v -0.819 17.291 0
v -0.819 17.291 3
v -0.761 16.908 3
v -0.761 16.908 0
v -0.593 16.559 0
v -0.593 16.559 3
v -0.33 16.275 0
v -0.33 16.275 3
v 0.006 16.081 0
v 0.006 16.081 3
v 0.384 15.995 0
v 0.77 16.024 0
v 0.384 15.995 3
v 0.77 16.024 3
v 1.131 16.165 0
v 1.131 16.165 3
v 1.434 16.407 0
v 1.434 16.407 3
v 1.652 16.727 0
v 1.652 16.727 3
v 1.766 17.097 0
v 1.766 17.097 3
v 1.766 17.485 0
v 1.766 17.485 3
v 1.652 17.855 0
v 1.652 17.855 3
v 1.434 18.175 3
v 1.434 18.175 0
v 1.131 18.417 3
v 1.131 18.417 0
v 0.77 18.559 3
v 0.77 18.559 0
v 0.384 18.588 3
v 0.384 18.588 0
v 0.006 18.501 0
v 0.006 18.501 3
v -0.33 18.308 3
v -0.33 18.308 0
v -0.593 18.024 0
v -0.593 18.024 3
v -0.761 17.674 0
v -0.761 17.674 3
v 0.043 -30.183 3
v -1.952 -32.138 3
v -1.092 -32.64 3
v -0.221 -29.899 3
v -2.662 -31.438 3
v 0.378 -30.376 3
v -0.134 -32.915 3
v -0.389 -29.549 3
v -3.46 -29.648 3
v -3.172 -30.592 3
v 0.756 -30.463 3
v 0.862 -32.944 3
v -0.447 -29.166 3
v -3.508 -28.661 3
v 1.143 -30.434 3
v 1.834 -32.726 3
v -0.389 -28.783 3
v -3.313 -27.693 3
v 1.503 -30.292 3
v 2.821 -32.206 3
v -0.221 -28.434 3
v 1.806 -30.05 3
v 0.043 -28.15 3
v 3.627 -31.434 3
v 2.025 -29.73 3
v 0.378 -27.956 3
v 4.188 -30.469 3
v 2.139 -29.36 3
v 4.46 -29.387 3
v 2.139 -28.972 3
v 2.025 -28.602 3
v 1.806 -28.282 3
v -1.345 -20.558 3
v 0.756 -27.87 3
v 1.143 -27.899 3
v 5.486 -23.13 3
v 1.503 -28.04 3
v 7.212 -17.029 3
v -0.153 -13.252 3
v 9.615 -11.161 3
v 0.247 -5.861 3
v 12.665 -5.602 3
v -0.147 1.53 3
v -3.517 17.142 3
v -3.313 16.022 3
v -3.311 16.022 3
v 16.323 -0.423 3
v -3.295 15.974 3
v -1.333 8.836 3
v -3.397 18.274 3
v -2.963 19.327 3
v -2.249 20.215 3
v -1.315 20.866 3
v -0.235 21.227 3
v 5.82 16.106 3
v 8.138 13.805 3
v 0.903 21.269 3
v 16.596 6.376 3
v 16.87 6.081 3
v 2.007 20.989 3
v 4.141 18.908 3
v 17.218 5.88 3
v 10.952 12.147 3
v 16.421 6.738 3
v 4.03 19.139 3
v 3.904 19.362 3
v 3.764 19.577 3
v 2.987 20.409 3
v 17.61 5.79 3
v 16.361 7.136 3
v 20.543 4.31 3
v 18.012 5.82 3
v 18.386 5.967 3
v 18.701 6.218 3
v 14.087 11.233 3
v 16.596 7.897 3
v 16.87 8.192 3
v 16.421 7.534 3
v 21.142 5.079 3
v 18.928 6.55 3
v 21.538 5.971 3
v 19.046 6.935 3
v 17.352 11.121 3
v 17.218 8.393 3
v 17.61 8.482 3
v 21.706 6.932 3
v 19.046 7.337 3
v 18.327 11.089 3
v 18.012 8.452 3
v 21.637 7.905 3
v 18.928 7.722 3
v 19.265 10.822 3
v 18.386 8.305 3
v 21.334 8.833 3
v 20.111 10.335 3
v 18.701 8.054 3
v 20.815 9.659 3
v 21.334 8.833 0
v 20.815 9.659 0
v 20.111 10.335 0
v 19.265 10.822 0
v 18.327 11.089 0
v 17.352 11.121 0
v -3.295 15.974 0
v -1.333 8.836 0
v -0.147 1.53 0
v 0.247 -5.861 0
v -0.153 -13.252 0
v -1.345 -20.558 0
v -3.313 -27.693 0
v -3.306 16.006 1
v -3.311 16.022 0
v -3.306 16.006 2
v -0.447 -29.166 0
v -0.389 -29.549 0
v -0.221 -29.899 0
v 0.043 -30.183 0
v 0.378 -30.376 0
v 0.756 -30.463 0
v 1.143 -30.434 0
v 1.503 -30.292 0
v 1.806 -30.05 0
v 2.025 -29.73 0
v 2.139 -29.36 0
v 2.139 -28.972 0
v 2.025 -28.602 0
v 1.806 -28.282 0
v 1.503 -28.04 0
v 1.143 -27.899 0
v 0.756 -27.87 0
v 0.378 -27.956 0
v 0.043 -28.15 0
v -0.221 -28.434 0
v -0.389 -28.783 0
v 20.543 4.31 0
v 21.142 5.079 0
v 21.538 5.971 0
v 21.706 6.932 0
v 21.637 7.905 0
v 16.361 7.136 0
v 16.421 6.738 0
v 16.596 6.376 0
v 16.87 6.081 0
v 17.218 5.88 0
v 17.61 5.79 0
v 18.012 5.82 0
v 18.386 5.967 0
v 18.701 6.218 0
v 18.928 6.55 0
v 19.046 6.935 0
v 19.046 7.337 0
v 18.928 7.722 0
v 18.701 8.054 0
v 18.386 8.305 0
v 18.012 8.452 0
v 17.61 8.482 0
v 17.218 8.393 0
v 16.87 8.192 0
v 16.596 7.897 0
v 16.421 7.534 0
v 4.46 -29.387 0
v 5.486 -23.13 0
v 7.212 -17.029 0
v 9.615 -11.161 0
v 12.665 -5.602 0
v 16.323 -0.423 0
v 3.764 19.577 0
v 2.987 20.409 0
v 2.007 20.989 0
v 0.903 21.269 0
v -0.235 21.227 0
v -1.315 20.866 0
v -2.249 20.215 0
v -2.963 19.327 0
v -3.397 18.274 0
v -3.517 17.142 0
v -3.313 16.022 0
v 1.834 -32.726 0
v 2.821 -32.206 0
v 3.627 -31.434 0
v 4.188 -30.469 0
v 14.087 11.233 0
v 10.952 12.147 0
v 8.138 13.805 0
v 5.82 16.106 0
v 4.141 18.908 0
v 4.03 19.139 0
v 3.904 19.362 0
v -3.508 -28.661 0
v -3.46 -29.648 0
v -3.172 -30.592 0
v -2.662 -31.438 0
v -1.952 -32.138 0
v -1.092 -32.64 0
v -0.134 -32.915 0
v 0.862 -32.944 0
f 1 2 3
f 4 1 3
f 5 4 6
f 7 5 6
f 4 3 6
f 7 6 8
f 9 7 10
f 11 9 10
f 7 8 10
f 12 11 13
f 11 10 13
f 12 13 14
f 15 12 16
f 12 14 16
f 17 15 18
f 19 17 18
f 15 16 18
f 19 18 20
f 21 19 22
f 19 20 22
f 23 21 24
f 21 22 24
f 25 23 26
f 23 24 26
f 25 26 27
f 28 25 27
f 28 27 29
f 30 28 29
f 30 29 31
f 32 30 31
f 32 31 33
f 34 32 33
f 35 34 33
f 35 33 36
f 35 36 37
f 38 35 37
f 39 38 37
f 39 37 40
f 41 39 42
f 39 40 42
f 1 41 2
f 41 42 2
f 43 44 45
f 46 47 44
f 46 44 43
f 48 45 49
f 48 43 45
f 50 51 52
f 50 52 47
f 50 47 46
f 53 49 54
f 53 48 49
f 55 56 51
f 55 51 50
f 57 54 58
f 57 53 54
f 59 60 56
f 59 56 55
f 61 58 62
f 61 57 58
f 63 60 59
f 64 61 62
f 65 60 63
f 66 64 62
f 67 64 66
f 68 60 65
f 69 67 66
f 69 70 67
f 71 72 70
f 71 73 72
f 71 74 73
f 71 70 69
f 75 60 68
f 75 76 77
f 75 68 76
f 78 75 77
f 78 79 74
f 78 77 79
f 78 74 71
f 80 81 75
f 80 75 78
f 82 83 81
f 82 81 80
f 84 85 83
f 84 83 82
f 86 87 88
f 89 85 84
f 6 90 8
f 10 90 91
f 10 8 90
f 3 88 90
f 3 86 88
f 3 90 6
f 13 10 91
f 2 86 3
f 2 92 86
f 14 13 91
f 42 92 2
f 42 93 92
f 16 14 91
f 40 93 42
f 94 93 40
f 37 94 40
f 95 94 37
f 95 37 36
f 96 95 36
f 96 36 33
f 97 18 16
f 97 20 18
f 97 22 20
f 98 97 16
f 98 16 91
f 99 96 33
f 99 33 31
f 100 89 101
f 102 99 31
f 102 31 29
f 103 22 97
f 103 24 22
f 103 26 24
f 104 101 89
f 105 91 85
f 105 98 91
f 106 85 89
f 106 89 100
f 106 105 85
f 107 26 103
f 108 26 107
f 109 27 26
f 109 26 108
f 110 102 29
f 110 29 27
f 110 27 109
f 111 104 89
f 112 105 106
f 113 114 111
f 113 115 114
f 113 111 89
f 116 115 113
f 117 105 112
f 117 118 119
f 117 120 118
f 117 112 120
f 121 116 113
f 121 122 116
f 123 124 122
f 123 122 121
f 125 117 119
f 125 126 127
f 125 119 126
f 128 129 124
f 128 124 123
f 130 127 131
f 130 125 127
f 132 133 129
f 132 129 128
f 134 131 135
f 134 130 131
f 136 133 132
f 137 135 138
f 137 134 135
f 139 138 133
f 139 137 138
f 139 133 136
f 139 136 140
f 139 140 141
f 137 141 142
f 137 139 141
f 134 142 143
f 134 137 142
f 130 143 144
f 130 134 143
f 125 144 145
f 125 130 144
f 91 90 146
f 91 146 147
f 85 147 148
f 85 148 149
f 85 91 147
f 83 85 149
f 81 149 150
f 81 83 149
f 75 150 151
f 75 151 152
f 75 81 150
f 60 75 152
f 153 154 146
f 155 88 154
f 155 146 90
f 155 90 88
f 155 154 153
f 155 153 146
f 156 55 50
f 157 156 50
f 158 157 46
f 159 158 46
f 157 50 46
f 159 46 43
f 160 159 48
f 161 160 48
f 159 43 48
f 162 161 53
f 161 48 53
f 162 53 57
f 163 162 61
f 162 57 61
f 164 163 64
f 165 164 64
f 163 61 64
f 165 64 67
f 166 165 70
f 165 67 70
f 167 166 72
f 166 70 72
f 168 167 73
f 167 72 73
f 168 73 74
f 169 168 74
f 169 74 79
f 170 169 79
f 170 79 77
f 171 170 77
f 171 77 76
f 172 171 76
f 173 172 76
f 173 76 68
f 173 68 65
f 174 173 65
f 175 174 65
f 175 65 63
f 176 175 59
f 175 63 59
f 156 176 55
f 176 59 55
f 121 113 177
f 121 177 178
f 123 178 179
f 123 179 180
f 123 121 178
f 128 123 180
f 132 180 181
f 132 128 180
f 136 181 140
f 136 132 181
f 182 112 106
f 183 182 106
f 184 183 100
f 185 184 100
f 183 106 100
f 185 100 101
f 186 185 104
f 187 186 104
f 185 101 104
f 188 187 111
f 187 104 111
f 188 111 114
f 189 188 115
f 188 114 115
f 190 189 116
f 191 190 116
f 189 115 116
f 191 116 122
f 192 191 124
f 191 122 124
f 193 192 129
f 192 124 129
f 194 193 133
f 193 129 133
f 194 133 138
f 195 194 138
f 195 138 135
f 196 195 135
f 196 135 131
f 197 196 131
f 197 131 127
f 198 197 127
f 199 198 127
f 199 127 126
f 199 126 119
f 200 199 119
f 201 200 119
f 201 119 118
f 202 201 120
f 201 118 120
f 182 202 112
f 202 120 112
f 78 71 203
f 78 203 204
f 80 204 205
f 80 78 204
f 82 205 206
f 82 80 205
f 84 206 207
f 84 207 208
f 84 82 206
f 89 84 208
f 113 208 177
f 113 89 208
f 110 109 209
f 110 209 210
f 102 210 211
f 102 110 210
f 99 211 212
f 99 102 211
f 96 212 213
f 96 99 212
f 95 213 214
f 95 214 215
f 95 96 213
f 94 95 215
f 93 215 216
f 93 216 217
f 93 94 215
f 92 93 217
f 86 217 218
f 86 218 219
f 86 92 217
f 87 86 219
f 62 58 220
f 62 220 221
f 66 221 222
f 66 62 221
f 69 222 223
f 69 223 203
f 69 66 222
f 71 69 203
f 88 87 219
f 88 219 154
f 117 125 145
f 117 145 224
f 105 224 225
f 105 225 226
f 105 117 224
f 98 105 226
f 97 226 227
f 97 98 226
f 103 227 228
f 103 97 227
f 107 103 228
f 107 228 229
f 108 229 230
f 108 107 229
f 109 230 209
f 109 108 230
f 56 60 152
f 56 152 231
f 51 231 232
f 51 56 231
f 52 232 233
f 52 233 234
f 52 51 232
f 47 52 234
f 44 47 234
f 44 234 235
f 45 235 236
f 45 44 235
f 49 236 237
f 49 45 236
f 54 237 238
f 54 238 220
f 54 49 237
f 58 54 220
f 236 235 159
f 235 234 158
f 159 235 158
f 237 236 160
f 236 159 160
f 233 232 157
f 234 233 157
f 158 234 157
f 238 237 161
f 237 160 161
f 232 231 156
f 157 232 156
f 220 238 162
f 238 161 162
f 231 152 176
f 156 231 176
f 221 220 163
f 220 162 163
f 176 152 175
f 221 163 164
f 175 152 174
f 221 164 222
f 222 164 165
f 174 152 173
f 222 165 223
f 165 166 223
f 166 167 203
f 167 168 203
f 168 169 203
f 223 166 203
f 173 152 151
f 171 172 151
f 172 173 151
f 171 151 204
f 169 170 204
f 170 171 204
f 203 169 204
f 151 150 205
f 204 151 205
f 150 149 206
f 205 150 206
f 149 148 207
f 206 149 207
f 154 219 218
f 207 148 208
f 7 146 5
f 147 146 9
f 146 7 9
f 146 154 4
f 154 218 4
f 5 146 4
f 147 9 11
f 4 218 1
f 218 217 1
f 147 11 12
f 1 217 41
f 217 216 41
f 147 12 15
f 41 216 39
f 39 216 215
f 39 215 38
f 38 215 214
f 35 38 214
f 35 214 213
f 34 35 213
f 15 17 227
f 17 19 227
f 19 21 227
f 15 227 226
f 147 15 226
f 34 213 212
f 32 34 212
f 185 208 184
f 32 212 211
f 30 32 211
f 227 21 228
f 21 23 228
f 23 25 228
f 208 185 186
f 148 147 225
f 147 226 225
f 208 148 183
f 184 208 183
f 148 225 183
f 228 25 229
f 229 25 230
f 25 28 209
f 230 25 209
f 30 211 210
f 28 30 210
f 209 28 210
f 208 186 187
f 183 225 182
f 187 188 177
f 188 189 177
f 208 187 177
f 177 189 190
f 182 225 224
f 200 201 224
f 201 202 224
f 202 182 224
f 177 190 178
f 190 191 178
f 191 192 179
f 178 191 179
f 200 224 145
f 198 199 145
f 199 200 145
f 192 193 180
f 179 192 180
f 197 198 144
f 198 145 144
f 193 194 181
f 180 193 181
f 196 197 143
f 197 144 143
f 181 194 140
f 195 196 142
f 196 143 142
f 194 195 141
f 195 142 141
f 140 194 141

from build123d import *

# Parameters (mm, degrees)
SKETCH_1_R      = 1.3
SKETCH_1_R_2    = 1.35
EXTRUDE_1_DEPTH = 3


with BuildPart() as part:
    # 草图1 → 凸台-拉伸1 (new body)
    with BuildSketch(Plane.XY.offset(3)):
        with BuildLine():
            Line((-3.313115848, 16.021732214), (-3.311115848, 16.021732214))
            add(Edge.make_bspline(
                [(-3.311115848, 16.021732214), (-3.305738612, 16.005657169), (-3.30036747, 15.989580634), (-3.295002421, 15.973502613)],
                knots=[0, 0, 0, 0, 1, 1, 1, 1], degree=3))
            ThreePointArc((-3.295002421, 15.973502613), (0.247391506, -5.861355765), (-3.313115848, -27.693267786))
            ThreePointArc((-3.313115848, -27.693267786), (-3.460091003, -29.647679281), (-2.661550551, -31.43755613))
            ThreePointArc((-2.661550551, -31.43755613), (-0.621865458, -32.807647593), (1.833911351, -32.726246371))
            ThreePointArc((1.833911351, -32.726246371), (3.626794929, -31.434157055), (4.459911351, -29.387246371))
            ThreePointArc((4.459911351, -29.387246371), (9.614888081, -11.161248479), (20.542617881, 4.309546771))
            ThreePointArc((20.542617881, 4.309546771), (21.651368965, 6.44631062), (21.333617881, 8.832546771))
            ThreePointArc((21.333617881, 8.832546771), (19.703322731, 10.604311941), (17.351617881, 11.120546771))
            ThreePointArc((17.351617881, 11.120546771), (9.493211165, 12.888433489), (4.140617881, 18.907546771))
            ThreePointArc((4.140617881, 18.907546771), (3.968487676, 19.251416126), (3.76413819, 19.577170986))
            ThreePointArc((3.76413819, 19.577170986), (-1.314904342, 20.865715039), (-3.313115848, 16.021732214))
        make_face()
        with Locations(Location((0.853283407, -29.166236957, 0), (0, 0, 180))):
            Circle(SKETCH_1_R, mode=Mode.SUBTRACT)
        with Locations(Location((0.480884152, 17.291232214, 0), (0, 0, 180))):
            Circle(SKETCH_1_R, mode=Mode.SUBTRACT)
        with Locations(Location((17.711384152, 7.136232214, 0), (0, 0, 180))):
            Circle(SKETCH_1_R_2, mode=Mode.SUBTRACT)
    extrude(amount=-EXTRUDE_1_DEPTH)


solid = part.part
